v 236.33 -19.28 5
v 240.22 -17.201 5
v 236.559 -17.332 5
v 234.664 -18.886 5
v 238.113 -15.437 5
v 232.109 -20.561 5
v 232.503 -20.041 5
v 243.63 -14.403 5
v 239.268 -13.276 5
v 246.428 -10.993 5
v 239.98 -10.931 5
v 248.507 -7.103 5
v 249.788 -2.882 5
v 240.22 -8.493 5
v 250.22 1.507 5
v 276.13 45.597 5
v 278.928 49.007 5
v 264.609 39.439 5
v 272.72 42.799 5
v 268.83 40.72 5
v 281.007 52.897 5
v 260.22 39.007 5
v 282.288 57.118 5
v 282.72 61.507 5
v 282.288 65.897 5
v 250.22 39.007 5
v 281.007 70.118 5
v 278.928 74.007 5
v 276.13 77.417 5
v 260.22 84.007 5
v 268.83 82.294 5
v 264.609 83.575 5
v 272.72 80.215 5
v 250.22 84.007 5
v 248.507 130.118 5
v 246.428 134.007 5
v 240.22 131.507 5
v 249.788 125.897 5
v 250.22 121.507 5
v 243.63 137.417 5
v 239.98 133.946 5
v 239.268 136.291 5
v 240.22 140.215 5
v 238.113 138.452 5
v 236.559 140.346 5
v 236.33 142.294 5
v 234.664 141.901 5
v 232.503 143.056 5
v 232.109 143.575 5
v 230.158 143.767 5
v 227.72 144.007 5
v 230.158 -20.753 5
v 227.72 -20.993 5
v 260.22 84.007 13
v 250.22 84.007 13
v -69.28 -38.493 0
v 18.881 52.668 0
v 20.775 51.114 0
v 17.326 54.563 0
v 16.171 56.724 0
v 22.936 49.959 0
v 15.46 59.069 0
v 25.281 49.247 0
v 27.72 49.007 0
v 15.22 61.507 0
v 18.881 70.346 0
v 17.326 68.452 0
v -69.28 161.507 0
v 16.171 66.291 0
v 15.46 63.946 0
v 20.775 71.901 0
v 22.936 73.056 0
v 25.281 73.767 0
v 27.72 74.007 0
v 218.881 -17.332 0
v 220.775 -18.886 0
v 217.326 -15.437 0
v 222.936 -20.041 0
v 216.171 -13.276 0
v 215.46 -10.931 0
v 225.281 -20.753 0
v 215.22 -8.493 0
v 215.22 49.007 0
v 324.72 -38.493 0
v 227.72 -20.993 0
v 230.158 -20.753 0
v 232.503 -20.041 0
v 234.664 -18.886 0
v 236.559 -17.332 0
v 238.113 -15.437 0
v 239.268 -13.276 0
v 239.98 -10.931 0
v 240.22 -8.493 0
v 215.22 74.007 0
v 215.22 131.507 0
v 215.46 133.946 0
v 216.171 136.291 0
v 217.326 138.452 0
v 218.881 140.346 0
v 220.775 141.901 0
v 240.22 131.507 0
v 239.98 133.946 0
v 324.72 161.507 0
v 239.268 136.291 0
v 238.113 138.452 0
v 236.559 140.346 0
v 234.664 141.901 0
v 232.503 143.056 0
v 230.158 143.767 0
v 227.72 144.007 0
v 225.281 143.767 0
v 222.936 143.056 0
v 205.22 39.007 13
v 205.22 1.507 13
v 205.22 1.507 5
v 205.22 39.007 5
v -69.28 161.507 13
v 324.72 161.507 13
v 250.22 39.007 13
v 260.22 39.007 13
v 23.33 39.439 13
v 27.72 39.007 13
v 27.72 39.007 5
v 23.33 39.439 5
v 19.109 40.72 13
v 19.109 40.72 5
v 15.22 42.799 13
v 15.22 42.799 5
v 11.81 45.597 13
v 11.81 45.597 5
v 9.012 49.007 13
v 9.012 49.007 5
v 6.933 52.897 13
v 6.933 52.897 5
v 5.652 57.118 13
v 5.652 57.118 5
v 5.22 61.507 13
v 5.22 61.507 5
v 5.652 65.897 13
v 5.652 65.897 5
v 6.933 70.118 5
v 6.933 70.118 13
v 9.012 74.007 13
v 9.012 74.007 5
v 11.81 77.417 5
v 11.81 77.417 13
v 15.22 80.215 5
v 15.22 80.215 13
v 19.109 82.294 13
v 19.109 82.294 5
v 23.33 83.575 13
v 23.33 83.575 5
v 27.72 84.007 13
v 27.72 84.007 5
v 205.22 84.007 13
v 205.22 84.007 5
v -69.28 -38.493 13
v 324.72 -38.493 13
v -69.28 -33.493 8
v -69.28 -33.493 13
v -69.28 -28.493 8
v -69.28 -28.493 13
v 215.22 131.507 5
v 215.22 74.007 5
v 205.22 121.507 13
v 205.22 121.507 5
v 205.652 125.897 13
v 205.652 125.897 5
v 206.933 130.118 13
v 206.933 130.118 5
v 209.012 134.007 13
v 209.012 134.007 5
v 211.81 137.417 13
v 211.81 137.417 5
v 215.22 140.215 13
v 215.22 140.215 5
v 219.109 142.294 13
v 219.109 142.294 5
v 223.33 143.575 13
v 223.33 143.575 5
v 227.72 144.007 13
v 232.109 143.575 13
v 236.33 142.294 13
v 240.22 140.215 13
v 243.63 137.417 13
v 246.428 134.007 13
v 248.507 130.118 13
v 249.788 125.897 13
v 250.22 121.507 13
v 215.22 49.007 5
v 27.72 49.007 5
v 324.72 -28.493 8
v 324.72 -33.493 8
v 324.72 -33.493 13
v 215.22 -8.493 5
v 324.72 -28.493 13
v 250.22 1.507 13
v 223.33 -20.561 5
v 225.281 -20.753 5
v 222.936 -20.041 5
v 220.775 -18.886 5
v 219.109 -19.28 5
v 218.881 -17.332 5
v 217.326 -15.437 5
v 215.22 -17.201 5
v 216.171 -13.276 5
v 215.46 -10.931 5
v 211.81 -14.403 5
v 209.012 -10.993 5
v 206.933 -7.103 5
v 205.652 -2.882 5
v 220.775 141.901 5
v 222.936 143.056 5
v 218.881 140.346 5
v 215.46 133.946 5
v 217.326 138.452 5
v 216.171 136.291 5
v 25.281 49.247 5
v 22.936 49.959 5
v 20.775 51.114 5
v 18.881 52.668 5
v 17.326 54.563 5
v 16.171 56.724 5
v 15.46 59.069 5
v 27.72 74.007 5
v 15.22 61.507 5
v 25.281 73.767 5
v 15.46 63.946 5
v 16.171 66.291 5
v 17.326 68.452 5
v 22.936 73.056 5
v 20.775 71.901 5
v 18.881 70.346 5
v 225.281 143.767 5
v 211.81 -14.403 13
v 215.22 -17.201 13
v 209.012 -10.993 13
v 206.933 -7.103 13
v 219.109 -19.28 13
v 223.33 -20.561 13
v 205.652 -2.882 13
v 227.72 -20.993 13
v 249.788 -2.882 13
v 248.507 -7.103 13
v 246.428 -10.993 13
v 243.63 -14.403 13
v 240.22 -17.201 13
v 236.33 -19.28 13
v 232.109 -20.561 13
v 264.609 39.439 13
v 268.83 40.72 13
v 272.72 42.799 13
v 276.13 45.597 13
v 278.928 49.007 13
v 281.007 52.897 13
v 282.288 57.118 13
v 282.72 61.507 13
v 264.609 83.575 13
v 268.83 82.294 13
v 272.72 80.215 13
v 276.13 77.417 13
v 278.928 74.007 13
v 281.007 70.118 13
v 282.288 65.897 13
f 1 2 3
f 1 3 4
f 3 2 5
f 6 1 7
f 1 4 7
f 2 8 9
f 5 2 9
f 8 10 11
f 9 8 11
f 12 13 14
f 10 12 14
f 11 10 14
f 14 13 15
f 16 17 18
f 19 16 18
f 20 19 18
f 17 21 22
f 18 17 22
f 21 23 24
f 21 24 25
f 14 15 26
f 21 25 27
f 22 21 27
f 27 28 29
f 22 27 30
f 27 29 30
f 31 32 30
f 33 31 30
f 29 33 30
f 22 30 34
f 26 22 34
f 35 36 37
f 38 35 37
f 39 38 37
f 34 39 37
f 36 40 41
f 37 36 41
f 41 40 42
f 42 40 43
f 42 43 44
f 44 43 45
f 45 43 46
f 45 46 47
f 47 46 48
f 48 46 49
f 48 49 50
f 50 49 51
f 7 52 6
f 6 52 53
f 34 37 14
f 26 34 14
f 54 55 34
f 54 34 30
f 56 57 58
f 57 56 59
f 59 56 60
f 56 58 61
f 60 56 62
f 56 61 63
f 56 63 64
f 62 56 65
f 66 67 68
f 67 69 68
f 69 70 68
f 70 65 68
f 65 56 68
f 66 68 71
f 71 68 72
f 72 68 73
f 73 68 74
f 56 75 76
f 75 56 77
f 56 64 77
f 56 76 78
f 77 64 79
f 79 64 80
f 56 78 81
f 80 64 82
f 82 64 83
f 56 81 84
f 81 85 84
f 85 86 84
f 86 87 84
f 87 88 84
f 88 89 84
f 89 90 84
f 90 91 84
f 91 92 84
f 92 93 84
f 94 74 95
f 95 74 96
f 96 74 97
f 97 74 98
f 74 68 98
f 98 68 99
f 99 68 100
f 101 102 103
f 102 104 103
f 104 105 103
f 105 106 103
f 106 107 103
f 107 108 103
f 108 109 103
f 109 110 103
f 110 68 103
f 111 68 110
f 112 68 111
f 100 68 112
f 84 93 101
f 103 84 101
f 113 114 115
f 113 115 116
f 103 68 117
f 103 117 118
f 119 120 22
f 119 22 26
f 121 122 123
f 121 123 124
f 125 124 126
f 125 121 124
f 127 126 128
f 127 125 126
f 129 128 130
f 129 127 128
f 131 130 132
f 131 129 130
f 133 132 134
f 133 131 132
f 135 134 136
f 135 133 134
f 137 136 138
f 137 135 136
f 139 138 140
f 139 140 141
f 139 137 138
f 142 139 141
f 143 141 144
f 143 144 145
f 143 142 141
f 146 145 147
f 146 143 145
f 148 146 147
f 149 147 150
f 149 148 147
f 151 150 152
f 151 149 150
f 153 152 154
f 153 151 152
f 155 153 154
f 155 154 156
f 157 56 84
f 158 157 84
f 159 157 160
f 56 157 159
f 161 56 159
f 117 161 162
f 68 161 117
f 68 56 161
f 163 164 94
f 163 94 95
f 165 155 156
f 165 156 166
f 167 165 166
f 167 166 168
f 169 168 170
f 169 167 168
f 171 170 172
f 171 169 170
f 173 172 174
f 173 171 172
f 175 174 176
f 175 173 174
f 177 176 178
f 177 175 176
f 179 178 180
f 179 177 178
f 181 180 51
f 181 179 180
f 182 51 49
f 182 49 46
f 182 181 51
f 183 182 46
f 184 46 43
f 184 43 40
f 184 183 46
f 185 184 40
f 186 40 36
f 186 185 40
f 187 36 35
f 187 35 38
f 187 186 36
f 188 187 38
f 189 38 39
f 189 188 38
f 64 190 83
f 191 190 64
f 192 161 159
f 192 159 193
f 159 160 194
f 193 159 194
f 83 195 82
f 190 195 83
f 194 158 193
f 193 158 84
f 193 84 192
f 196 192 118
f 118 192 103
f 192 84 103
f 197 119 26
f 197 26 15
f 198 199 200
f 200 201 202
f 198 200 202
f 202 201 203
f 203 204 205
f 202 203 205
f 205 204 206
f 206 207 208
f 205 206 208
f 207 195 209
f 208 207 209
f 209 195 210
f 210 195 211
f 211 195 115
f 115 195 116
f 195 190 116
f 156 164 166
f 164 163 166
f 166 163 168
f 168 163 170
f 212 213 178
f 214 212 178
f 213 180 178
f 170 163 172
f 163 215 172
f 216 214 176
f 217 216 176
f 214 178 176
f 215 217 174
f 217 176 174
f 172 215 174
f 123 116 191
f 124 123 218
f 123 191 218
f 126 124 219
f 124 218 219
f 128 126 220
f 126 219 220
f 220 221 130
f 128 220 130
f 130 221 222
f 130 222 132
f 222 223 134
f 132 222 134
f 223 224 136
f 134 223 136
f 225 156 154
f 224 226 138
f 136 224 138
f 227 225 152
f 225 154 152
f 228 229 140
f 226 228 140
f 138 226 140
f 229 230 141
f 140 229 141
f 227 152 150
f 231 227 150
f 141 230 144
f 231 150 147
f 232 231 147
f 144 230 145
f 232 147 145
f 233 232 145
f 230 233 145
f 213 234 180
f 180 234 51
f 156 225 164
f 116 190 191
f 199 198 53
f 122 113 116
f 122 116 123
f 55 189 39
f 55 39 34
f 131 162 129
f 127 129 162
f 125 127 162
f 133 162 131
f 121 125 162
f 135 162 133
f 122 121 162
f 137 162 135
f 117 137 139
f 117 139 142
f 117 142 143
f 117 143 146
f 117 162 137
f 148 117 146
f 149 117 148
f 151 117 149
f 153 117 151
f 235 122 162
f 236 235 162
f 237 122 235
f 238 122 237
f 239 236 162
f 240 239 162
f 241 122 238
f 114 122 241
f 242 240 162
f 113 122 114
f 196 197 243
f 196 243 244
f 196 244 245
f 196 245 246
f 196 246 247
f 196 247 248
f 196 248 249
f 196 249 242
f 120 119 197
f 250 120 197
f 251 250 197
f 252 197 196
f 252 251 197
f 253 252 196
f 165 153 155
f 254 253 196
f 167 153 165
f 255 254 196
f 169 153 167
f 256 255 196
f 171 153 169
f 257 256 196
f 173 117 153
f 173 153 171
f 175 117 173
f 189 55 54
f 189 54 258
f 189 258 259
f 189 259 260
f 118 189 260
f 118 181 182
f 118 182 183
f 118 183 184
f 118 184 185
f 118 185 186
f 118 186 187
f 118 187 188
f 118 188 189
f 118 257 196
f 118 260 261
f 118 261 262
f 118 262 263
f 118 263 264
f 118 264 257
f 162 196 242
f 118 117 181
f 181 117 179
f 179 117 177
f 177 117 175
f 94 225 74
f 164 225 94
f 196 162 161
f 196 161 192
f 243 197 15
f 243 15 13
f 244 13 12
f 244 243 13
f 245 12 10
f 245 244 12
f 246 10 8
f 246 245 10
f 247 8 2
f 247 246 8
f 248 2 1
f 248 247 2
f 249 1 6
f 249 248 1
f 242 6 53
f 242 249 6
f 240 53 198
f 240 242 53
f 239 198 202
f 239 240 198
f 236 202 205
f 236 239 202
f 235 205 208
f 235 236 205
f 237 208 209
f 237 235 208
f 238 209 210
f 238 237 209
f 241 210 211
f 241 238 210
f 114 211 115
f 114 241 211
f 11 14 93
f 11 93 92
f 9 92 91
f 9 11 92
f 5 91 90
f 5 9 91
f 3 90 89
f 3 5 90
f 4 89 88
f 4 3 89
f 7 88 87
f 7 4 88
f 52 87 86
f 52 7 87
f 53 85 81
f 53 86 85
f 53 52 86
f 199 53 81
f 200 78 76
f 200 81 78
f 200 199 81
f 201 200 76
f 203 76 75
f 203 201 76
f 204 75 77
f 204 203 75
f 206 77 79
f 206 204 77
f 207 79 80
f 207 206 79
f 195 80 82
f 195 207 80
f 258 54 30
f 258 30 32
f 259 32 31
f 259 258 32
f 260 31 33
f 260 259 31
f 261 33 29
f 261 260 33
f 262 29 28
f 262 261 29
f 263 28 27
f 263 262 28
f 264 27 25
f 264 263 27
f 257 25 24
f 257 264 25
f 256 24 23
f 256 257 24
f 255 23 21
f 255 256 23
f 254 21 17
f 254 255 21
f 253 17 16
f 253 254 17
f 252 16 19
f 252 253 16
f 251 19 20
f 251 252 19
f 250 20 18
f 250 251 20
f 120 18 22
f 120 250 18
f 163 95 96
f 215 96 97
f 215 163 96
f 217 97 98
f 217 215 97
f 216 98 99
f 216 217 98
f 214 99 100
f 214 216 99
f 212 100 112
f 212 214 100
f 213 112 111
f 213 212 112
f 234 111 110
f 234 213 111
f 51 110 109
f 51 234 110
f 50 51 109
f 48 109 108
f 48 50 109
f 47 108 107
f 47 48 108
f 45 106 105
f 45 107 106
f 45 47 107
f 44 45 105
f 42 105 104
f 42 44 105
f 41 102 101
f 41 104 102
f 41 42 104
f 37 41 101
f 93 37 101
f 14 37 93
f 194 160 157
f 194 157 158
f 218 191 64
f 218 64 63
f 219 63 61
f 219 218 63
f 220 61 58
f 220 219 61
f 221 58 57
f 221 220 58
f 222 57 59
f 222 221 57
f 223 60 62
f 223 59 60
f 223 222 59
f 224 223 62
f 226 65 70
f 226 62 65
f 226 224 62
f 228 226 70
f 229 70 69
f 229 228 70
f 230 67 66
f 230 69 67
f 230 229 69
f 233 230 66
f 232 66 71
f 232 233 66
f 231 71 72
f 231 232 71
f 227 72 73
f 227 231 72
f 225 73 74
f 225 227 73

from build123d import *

# Parameters (mm, degrees)
SKETCH_1_W          = 394
SKETCH_1_H          = 200
EXTRUDE_1_DEPTH     = 13
SKETCH_2_W          = 394
SKETCH_2_H          = 5
CUT_EXTRUDE_1_DEPTH = 5
CUT_EXTRUDE_2_DEPTH = 363.900192956
CUT_EXTRUDE_3_DEPTH = 8


with BuildPart() as part:
    # ｽｹｯﾁ1 → ﾎﾞｽ - 押し出し1 (new body)
    with BuildSketch(Plane.XY):
        with Locations((127.719868277, 61.507142857)):
            Rectangle(SKETCH_1_W, SKETCH_1_H)
    extrude(amount=EXTRUDE_1_DEPTH)

    # ｽｹｯﾁ2 → ｶｯﾄ - 押し出し1 (cut)
    with BuildSketch(Plane.XY.offset(13)):
        with Locations((127.719868277, -30.992857143)):
            Rectangle(SKETCH_2_W, SKETCH_2_H)
    extrude(amount=-CUT_EXTRUDE_1_DEPTH, mode=Mode.SUBTRACT)

    # ｽｹｯﾁ3 → ｶｯﾄ - 押し出し2 (cut, through all)
    with BuildSketch(Plane.XY.offset(13)):
        with BuildLine():
            Line((27.719868277, 74.007142857), (215.219868277, 74.007142857))
            Line((215.219868277, 74.007142857), (215.219868277, 131.507142857))
            ThreePointArc((215.219868277, 131.507142857), (227.719868277, 144.007142857), (240.219868277, 131.507142857))
            Line((240.219868277, 131.507142857), (240.219868277, -8.492857143))
            ThreePointArc((240.219868277, -8.492857143), (227.719868277, -20.992857143), (215.219868277, -8.492857143))
            Line((215.219868277, -8.492857143), (215.219868277, 49.007142857))
            Line((215.219868277, 49.007142857), (27.719868277, 49.007142857))
            ThreePointArc((27.719868277, 49.007142857), (15.219868277, 61.507142857), (27.719868277, 74.007142857))
        make_face()
    extrude(amount=-CUT_EXTRUDE_2_DEPTH, mode=Mode.SUBTRACT)

    # ｽｹｯﾁ6 → ｶｯﾄ - 押し出し3 (cut)
    with BuildSketch(Plane.XY.offset(13)):
        with BuildLine():
            Line((27.719868277, 84.007142857), (205.219868277, 84.007142857))
            Line((205.219868277, 84.007142857), (205.219868277, 121.507142857))
            ThreePointArc((205.219868277, 121.507142857), (227.719868277, 144.007142857), (250.219868277, 121.507142857))
            Line((250.219868277, 121.507142857), (250.219868277, 84.007142857))
            Line((250.219868277, 84.007142857), (260.219868277, 84.007142857))
            ThreePointArc((260.219868277, 84.007142857), (282.719868277, 61.507142857), (260.219868277, 39.007142857))
            Line((260.219868277, 39.007142857), (250.219868277, 39.007142857))
            Line((250.219868277, 39.007142857), (250.219868277, 1.507142857))
            ThreePointArc((250.219868277, 1.507142857), (227.719868277, -20.992857143), (205.219868277, 1.507142857))
            Line((205.219868277, 1.507142857), (205.219868277, 39.007142857))
            Line((205.219868277, 39.007142857), (27.719868277, 39.007142857))
            ThreePointArc((27.719868277, 39.007142857), (5.219868277, 61.507142857), (27.719868277, 84.007142857))
        make_face()
    extrude(amount=-CUT_EXTRUDE_3_DEPTH, mode=Mode.SUBTRACT)


solid = part.part
